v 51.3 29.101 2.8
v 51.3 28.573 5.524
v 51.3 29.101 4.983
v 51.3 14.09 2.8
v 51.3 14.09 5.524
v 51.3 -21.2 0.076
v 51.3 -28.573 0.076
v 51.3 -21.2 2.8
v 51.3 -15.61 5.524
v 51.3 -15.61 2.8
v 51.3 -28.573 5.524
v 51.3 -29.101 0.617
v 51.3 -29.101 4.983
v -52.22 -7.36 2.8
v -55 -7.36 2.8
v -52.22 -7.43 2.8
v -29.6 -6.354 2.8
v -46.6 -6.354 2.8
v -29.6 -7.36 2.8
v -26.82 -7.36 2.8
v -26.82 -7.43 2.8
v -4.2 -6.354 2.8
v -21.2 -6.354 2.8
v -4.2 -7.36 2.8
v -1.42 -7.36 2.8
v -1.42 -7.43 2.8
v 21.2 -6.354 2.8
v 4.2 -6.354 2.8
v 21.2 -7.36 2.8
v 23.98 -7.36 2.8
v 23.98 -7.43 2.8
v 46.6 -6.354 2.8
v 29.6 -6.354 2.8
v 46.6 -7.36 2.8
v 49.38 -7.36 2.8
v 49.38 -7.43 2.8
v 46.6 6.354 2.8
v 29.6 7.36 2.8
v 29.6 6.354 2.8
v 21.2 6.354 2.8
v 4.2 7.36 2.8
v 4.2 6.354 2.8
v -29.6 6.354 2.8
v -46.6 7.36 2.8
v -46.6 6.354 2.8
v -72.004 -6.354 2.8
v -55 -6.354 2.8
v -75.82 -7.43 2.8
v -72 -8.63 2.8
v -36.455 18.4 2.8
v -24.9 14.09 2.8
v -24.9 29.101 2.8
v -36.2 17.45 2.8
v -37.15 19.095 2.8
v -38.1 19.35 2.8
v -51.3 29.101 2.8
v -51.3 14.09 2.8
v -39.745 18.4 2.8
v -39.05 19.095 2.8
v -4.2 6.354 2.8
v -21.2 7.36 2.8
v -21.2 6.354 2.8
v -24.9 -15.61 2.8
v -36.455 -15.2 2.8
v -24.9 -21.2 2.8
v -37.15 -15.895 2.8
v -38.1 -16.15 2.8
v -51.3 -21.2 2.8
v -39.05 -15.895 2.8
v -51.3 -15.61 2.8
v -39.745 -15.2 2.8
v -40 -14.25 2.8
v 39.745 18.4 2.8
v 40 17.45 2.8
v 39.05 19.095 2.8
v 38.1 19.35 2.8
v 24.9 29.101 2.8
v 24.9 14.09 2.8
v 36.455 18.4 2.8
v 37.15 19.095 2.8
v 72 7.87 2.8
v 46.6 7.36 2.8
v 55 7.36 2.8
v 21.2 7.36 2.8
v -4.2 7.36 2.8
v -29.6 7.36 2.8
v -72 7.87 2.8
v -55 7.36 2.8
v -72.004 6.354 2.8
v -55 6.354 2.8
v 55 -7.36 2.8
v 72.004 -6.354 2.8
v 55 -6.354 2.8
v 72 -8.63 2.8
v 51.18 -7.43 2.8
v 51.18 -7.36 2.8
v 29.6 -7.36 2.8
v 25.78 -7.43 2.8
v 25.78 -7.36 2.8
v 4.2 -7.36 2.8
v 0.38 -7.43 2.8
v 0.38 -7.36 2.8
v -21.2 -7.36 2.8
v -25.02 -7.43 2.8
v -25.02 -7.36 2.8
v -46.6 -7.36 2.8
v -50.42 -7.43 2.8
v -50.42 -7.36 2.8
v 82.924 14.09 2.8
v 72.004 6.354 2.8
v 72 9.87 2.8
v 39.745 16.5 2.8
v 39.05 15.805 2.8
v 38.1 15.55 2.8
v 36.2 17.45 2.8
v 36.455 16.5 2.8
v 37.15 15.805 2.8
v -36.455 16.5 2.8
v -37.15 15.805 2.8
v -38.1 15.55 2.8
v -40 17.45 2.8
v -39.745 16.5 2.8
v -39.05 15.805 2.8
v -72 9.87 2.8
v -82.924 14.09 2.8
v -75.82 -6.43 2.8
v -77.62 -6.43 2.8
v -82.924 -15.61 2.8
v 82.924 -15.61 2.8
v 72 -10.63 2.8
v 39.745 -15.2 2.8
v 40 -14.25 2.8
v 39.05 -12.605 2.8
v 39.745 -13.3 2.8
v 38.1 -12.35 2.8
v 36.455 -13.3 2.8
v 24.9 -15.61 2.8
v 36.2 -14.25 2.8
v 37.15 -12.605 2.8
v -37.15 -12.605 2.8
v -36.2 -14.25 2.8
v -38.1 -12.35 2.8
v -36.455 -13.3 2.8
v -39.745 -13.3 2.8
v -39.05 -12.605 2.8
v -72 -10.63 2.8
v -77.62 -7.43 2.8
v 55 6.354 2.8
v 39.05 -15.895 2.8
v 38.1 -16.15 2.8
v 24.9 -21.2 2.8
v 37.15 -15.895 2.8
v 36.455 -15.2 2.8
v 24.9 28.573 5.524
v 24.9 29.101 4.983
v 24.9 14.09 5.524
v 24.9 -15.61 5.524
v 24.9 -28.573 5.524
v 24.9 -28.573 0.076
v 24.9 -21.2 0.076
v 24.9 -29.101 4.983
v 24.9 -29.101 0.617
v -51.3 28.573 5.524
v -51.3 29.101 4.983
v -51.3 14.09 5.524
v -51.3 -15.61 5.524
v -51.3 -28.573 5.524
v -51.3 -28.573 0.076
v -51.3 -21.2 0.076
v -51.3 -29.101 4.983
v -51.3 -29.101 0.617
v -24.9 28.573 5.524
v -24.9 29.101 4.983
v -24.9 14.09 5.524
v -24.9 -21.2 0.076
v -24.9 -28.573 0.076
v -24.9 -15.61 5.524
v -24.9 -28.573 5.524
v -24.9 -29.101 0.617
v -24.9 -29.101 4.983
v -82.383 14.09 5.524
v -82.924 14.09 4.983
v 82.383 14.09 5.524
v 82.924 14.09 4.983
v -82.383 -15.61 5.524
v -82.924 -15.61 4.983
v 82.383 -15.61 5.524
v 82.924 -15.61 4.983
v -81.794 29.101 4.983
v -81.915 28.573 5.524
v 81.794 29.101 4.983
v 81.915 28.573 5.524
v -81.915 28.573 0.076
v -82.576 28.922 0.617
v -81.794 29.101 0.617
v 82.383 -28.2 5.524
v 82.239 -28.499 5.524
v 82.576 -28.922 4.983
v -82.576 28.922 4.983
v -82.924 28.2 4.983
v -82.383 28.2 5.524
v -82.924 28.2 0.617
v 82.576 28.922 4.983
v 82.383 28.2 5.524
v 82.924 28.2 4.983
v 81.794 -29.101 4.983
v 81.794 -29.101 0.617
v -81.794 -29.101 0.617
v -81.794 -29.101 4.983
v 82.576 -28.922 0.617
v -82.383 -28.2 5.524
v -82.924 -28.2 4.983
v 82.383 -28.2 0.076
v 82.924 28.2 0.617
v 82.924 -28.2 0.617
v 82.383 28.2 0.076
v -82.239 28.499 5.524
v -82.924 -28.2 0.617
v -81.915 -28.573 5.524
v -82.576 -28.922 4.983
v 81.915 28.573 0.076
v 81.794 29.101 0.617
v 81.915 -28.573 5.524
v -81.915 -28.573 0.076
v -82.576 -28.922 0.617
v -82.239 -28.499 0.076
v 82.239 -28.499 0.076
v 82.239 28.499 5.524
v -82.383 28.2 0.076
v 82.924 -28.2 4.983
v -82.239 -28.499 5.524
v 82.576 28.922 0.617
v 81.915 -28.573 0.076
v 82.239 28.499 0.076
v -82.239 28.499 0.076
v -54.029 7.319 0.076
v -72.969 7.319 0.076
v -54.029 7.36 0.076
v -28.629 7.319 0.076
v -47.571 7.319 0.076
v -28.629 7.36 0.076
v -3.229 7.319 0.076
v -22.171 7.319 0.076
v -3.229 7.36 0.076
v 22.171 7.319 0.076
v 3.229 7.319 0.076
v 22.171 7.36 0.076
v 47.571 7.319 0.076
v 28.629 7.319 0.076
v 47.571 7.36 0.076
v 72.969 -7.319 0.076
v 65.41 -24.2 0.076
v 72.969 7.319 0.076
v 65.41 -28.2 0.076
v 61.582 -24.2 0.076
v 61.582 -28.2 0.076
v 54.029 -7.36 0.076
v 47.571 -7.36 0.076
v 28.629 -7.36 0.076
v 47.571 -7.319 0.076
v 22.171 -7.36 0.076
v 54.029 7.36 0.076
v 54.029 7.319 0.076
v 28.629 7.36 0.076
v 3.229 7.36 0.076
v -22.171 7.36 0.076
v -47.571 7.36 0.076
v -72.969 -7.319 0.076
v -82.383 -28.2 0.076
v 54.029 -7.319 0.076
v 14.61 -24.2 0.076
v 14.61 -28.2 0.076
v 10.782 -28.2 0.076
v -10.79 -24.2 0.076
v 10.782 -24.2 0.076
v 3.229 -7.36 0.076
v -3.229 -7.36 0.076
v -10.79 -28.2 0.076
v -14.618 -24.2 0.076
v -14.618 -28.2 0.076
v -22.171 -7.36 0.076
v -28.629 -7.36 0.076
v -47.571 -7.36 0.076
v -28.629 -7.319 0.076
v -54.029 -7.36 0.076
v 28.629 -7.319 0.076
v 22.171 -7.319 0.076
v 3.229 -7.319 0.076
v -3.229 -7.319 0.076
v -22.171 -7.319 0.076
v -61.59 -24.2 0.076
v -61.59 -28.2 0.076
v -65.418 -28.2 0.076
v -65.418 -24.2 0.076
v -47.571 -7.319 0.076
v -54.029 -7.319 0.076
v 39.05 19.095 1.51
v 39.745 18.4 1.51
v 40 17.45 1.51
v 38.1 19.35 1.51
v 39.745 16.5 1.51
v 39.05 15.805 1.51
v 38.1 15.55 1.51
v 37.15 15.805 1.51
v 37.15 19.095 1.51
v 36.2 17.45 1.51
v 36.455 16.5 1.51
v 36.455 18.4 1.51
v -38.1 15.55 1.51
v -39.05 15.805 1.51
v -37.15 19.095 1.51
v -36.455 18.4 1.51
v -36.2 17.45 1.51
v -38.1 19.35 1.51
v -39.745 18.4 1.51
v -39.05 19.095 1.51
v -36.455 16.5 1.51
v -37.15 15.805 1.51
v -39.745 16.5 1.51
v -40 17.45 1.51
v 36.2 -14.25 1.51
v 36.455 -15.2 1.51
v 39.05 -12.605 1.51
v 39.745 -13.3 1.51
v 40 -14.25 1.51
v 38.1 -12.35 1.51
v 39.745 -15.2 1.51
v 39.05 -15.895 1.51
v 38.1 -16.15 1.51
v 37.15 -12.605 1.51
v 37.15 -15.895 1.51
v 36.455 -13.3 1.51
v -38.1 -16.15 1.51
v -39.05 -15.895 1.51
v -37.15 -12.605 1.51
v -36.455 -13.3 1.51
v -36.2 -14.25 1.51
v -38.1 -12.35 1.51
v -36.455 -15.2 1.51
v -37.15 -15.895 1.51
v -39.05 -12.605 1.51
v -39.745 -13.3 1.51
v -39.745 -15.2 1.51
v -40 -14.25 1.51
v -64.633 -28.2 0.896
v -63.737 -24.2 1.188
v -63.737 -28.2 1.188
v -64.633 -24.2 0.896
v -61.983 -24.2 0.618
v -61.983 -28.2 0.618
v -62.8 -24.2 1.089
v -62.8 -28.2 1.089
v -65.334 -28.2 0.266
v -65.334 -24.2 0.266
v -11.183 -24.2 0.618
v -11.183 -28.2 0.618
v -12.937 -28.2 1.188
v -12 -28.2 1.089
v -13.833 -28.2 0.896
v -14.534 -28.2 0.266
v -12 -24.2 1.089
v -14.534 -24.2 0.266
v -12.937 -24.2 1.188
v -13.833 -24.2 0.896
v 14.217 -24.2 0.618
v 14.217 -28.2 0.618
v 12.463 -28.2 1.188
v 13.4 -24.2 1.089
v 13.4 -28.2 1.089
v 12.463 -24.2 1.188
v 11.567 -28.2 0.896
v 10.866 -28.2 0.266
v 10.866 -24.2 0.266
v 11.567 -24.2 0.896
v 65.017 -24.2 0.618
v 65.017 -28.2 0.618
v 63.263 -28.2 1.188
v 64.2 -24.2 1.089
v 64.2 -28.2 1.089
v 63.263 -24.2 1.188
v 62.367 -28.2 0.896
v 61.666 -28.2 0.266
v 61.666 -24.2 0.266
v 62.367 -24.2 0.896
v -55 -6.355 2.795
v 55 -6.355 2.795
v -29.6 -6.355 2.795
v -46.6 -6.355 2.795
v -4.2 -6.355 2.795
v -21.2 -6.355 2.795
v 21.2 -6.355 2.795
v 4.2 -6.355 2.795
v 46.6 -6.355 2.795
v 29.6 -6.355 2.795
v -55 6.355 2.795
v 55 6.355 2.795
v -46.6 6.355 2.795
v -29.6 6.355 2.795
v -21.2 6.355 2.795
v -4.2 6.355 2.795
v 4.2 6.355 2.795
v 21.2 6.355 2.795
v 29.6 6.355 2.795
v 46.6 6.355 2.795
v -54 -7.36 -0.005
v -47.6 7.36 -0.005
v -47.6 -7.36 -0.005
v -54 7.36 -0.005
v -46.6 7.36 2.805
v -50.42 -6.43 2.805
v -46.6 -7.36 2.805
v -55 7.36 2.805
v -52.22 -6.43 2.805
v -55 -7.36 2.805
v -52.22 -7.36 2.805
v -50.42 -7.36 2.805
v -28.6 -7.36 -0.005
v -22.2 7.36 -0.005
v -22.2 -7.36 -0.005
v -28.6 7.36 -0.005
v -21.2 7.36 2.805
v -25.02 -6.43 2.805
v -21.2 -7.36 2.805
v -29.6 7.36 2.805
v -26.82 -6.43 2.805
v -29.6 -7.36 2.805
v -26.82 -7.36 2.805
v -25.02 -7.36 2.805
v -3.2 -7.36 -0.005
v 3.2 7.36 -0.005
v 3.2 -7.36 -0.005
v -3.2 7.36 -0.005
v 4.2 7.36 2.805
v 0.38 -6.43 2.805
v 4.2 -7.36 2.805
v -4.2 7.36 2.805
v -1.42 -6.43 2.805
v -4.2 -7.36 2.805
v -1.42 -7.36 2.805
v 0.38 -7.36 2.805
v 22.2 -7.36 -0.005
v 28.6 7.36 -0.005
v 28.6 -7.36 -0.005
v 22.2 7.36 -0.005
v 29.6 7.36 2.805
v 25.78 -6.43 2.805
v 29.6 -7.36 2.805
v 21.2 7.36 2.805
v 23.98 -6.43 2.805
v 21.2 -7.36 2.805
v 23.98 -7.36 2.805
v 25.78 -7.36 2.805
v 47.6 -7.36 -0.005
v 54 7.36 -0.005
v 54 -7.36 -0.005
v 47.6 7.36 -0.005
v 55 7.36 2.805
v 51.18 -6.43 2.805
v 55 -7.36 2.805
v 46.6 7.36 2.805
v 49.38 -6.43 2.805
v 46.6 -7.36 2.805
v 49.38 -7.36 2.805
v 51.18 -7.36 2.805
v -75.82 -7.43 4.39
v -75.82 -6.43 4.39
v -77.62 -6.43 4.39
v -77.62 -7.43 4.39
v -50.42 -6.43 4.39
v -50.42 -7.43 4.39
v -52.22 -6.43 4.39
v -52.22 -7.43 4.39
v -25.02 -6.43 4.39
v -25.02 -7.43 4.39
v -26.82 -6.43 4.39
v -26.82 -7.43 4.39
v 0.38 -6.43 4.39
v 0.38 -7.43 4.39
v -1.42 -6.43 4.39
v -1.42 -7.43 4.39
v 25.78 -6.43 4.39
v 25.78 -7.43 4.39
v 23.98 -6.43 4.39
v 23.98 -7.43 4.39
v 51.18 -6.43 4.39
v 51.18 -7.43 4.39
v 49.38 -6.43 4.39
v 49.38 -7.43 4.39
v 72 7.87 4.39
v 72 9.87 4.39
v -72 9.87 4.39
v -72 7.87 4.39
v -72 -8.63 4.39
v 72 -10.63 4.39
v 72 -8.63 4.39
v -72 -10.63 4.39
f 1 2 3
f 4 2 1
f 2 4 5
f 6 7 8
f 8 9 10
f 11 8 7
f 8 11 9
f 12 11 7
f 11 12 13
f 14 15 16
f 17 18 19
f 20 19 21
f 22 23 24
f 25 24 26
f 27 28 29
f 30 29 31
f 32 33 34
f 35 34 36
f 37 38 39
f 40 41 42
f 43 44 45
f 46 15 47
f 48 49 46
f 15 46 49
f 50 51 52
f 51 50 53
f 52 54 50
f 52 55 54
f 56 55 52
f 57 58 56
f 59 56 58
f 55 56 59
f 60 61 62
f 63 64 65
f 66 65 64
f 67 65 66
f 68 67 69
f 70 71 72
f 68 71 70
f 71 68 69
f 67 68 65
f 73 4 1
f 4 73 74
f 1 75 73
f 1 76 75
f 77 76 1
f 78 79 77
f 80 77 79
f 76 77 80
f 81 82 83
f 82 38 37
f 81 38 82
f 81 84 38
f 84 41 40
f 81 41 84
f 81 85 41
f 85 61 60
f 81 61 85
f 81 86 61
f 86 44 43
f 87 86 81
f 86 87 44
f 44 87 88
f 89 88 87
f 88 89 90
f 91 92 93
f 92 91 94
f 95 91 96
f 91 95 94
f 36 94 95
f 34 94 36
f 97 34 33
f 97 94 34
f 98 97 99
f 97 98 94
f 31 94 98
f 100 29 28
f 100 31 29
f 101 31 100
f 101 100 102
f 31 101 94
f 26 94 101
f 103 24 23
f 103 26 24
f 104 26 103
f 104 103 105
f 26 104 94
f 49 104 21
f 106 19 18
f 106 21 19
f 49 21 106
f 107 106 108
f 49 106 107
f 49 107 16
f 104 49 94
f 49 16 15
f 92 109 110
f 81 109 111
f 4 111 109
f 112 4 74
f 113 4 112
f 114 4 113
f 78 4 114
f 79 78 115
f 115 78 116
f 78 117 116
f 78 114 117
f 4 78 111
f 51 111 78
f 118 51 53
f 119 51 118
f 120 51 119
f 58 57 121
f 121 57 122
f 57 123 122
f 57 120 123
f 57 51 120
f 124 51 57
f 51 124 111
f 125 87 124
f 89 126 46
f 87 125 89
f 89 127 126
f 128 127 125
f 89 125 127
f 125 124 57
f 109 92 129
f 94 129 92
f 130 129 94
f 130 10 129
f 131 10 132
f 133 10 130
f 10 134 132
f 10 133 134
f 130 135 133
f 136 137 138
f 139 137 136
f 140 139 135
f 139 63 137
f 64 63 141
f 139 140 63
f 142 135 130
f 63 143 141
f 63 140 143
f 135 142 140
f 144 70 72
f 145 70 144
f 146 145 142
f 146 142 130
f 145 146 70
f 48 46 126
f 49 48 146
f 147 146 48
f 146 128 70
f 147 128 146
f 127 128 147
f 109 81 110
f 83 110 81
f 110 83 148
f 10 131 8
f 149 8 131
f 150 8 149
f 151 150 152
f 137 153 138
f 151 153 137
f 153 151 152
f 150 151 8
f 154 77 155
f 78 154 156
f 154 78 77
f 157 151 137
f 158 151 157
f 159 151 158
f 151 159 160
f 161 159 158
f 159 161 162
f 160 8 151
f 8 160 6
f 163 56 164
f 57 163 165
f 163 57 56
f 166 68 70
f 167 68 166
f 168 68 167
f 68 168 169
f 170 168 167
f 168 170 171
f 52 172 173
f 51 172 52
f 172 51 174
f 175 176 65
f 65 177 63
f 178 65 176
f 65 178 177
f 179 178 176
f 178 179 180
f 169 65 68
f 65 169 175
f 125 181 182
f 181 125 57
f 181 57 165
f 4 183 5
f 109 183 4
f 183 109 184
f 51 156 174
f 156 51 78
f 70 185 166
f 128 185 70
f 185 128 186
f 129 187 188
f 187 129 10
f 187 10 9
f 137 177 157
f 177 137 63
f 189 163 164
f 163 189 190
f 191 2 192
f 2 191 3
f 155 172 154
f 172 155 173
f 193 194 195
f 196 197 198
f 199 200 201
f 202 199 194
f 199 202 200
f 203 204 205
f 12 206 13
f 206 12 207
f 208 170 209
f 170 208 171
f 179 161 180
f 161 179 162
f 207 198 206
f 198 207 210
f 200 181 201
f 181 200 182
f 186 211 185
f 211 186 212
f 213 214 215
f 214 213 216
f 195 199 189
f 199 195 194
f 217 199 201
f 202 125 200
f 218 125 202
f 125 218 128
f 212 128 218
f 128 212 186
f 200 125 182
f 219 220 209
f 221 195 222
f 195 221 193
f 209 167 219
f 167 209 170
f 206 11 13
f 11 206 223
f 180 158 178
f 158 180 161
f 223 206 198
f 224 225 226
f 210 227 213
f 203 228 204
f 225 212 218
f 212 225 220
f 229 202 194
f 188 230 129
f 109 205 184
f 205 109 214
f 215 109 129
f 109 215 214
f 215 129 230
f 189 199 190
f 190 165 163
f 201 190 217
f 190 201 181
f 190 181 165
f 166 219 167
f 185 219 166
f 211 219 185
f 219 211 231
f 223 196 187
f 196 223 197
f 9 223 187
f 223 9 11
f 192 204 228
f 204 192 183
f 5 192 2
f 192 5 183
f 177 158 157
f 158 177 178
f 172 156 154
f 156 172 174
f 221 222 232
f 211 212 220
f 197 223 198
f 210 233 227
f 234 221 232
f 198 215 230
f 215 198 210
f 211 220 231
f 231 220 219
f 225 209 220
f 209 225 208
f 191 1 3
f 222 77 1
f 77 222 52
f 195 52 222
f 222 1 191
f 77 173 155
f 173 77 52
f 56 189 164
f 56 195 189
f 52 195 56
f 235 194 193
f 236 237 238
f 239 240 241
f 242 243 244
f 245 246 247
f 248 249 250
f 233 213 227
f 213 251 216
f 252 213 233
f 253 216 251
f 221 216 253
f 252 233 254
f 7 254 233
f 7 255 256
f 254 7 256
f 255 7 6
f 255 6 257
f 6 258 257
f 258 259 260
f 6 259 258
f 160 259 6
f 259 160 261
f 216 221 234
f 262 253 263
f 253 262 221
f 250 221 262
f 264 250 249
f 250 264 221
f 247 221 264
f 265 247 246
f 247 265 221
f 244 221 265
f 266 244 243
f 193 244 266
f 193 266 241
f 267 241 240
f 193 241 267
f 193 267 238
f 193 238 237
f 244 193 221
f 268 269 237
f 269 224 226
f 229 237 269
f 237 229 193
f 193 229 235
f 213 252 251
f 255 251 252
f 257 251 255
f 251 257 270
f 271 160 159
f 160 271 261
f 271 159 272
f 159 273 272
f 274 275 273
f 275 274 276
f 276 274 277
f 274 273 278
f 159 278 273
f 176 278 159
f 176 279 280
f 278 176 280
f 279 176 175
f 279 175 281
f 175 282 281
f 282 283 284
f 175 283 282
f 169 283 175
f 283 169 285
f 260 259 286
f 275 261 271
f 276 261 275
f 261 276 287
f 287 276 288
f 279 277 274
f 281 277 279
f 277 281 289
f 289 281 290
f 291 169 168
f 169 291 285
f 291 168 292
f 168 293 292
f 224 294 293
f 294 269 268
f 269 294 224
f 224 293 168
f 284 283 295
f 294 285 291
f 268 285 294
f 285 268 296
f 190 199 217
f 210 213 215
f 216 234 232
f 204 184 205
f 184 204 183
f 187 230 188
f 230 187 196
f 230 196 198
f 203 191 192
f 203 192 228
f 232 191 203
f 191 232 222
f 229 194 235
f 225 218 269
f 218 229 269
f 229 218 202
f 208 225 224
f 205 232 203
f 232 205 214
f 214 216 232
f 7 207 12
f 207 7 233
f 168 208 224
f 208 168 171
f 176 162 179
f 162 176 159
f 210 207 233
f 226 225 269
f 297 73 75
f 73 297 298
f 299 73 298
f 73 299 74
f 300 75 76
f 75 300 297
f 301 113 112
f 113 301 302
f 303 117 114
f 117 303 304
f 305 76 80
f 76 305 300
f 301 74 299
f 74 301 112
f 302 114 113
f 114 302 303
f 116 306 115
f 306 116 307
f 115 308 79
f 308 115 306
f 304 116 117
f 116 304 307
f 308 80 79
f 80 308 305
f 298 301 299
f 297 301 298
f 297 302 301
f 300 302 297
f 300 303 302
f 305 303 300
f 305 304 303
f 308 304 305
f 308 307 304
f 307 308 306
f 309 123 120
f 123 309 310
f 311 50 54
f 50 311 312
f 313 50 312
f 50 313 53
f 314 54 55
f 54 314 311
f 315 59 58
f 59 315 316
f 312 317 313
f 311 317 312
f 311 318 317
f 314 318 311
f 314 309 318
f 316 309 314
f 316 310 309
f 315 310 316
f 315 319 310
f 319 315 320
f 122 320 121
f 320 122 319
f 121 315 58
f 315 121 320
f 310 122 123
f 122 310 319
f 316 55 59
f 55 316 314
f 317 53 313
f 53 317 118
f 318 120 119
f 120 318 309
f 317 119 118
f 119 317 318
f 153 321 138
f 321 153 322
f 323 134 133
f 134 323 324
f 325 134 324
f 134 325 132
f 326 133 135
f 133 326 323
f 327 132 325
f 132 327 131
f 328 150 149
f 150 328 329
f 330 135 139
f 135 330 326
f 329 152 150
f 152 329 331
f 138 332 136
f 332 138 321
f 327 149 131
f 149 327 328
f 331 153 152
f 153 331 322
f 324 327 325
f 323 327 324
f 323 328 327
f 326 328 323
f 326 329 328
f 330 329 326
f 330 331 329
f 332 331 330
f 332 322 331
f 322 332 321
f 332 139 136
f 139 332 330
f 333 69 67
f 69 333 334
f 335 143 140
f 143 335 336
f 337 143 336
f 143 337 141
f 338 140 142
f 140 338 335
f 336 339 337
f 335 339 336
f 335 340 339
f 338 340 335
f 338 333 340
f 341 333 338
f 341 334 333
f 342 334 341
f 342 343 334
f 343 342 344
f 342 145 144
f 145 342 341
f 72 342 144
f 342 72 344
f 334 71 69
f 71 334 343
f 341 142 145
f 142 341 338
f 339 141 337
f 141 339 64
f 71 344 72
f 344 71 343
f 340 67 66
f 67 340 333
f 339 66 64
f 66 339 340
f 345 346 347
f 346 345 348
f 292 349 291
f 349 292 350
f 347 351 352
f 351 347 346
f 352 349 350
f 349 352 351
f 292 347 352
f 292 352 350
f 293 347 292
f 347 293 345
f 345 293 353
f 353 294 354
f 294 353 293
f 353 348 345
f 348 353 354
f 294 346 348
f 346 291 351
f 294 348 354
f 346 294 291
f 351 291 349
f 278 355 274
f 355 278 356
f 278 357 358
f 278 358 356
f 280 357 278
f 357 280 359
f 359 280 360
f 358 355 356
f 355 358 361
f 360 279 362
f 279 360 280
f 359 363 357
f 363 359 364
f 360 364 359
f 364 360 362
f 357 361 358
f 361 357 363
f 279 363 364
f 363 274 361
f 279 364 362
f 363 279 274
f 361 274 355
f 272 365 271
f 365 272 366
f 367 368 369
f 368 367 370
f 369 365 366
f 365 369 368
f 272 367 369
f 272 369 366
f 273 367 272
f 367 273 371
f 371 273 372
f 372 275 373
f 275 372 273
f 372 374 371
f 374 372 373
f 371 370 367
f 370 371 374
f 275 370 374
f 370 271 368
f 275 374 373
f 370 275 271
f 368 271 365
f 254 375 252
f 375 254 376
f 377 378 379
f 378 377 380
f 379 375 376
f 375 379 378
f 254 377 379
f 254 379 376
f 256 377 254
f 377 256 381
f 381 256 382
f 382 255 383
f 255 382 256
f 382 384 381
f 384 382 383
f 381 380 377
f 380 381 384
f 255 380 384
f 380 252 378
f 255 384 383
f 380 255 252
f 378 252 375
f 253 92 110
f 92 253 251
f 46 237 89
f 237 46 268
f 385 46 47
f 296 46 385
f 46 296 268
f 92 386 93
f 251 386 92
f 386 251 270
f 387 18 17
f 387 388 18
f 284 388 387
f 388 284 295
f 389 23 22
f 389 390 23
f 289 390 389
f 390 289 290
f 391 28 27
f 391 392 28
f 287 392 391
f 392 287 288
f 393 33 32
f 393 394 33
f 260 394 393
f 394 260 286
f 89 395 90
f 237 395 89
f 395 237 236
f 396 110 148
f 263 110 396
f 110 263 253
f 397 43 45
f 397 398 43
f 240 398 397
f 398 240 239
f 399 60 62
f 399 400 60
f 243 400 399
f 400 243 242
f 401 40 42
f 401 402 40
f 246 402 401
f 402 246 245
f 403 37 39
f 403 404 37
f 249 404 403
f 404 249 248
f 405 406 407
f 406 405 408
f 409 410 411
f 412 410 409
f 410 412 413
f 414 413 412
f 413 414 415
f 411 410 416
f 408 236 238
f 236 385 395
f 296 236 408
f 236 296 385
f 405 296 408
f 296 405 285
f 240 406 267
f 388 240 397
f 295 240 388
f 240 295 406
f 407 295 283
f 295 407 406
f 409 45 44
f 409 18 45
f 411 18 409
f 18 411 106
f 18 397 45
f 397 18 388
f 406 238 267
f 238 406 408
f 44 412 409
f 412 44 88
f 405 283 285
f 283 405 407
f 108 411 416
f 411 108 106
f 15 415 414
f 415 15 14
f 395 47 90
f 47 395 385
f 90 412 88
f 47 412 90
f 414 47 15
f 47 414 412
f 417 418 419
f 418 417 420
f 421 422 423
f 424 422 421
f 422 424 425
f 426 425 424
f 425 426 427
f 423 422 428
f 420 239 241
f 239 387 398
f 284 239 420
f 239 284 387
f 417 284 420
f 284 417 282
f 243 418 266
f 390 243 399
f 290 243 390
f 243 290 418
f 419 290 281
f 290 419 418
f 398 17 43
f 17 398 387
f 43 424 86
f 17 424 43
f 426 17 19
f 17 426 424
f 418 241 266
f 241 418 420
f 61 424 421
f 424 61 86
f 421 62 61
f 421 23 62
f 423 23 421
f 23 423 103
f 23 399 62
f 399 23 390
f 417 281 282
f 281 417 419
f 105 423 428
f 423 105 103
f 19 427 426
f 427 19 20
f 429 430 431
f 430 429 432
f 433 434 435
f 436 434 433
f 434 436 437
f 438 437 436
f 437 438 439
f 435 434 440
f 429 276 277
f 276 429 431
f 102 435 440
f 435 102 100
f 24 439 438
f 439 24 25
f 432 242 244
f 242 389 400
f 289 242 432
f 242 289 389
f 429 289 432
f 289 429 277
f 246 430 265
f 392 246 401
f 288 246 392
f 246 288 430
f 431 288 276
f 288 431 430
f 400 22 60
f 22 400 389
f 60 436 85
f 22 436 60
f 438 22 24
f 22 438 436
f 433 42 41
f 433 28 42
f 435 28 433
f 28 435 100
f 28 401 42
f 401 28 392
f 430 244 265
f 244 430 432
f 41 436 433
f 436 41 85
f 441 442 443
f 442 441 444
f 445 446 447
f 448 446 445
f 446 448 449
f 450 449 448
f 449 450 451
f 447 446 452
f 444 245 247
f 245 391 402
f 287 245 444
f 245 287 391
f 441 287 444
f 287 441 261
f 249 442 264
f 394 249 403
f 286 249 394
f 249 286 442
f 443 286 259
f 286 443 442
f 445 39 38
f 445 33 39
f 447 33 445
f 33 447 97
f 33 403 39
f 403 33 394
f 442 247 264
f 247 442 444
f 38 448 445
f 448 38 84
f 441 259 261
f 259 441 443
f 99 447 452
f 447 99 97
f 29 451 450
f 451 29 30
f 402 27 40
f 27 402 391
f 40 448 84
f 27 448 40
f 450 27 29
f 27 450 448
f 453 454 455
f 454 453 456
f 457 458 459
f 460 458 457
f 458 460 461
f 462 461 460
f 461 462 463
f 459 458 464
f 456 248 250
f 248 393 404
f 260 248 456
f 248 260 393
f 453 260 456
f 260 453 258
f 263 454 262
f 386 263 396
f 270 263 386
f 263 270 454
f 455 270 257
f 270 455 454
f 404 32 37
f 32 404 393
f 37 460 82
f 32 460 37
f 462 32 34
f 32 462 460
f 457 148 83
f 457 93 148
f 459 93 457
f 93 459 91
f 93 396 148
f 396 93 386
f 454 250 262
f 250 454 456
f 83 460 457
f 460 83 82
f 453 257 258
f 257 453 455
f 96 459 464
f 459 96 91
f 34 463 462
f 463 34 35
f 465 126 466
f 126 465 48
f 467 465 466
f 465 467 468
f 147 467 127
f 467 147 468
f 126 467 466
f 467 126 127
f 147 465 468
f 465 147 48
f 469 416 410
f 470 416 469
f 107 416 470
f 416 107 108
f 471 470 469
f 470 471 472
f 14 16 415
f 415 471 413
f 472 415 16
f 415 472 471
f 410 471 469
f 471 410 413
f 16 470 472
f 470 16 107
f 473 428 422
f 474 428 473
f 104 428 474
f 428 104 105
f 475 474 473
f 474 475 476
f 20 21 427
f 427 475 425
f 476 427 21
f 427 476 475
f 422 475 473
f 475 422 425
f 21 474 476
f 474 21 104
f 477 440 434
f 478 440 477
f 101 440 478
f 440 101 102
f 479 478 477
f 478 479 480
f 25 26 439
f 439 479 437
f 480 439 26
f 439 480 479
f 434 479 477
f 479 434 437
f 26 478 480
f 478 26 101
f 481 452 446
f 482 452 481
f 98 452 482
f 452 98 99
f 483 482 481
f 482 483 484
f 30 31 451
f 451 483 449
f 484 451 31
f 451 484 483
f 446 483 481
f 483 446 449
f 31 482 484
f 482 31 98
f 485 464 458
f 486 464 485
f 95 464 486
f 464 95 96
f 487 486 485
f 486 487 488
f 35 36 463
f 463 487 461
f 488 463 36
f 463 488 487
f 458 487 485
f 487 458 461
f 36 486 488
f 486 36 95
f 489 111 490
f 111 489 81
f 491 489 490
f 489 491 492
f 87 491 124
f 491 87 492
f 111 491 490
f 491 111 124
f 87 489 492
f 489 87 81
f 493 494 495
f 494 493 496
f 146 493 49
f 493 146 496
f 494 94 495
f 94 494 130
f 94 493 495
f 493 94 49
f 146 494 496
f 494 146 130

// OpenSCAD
// -*- mode: SCAD ; c-file-style: "ellemtel" ; coding: utf-8 -*-
//
// Holder to scan 110 film strips with a Reflecta ProScan 10T
//
// Copyright 2018 Roland Sieker <ospalh@gmail.com>
// Licence: CC-BY-SA 4.0


/* [Global] */


// ... to preview. You will get both parts when you click "Create Thing".
part = "halter"; // [halter: film holder, einsatz: film holder clamp]

// Set this to "render" and click on "Create Thing" when done with the setup.
preview = 1; // [0:render, 1:preview]

/* [Holder] */

// Width of the holder. This one and the next one are the two values you do need to set up for your scanner. Preset is for a Reflecta proScan. Maybe subtract half a millimtre for a better fit.
holder_width = 58.4;  // [20:0.1:150]

// Height or thickness of the holder. See above. You know they were too high when you need a mallet to go from one image to the next...
holder_thickness = 5.6;  // [3:0.1:10]

// How many exposures on the longest strips you want to fit into this. Make sure the resulting holder still fits onto your print bed.
images_per_strip = 6;  // [1:1:15]

// Different manufacturers' scanners place their little catches to position the holder at different sides.
position_notch_side = 90;  // [90: bottom, 0: side]

/* [Magnets] */

// Diameter of the magnet hole. Add clearance by hand here. Set to 0 for no magnet holes.
magnet_diameter = 3.8;  // [0:0.1:15]
// Height or thickness of the magnet. Make sure to use magnets flat enough to fit.
magnet_height = 1;  // [0.5:0.1:3]

/* [Hidden] */

// Das ganze Filmgroessen-Geraffel wieder verstecken: ein thing pro
// Film. Teil der Automatik (mit/ohne Stege, Lang-oder Kurzkerbe) sind so
// halbwegs inaktiv.


// Width of the film
film_width = 16;  // [8:0.1:70]
// Length from the left edge of an exposure to its right edge
image_width = 17; // [8:0.1:100]
image_pitch = 127/5;  // Ein Fuenferstreifen ist genau so lang wie ein
// vierer 126-Streifen. Angeblich ist das irgend etwas rundes in
// Zoellen. Das muss mich nicht scheren.

// Size of an exposure from bottom to top.
image_height = 12.7; // Genau 300 Pixel hoch bei einem 600 dpi Scan.
rand_unten = 1.27;  // Koennten 1/20 Zoll sein. What TF ever. Ich koennte 118 Schweizerfranken bezahlen und es im Standard nachlesen. Oder das Geld sparen
rand_oben = film_width - image_height - rand_unten;

bildabstand = max(image_pitch, image_width);
l_filmsteg = max(0, bildabstand-image_width);
r_r = 1.0;  // Rundungsradius

// Auch wichtig:
l_zk = 4;  // Laenge Zentrierkerbe
b_zk = 4;  // Breite Zentrierkerbe
h_zk = 1.2;  // Tiefe der Zentrierkerbe
w_zk = 1;  // Wand bzw Abstand der Zentrierkerbe vom Rand





w_schraeg = 1;  // Breite der Abschraegung rund um die Filmfenster

kurzsteg_grenze = w_schraeg;  // Weniger als 1 mm pro Seite: Kurzstege

mit_langsteg_oben = ( rand_oben >= kurzsteg_grenze);
mit_langsteg_unten = ( rand_unten >= kurzsteg_grenze);

min_l_ksteg = 0.8;

w_steg = 2;  // Breite fuer Stuecke, die den Film zentrieren.
l_kurzsteg = 0.4*bildabstand;  // Laenge fuer Stuecke, die den Film zentrieren,
// wenn wir keine Fensterstege machen


magnet_off_oben = -2;
magnet_off_unten = 1.2;

w_filmloch = 1.5;
l_filmloch = 2.3;
// dy_fl_bl = 1.25; // Abstand Filmloch oben zum Blidbereich
dy_fl_k = 0.7;  // Abstand Filmloch oben zur Filmkante
dx_fl_sm = 0.63;  // Abstand Filmloch links zur Mitte des Stegs


// *******************************************************
// Extra parameters. These can be changed reasonably safely.


w = 1.8;  // Wall width
p = 1.2;  // Bottom, top plate height
c = 0.5;  // Clearance
c_z = 0.3;  // Clearance in z direction. Mostly for the magnet hole and centering ridge
angle = 60; // Overhangs much below 60 degrees are a problem for me


// Halbwegs wichtig
h_steg = 1.6;  // Hoehe fuer Stuecke, die den Film zentrieren.
h_nut = h_steg + c_z;  // Tiefe fuer Stuecke, auf denen der Film nicht aufliegt



// *******************************************************
// Some shortcuts. These shouldn't be changed

tau = 2 * PI;  // pi is still wrong. tau = circumference / r

xy_factor = 1/tan(angle);
// To get from a height to a horizontal width inclined correctly
z_factor = tan(angle);  // The other way around

some_distance = 1.2 * holder_width;
ms = 0.01;  // Muggeseggele.

// fn for differently sized objects and fs, fa; all for preview or rendering.
pna = 40;
pnb = 15;
pa = 5;
ps = 1;
rna = 180;
rnb = 30;
ra = 1;
rs = 0.1;
function na() = (preview) ? pna : rna;
function nb() = (preview) ? pnb : rnb;
$fs = (preview) ? ps : rs;
$fa = (preview) ? pa : ra;

// l_fenster = bildabstand * images_per_strip;
l_fenster = bildabstand * (images_per_strip - 1) + image_width;
l_rand = 2 * w_steg + w_schraeg + 6;  // Etwas mehr fuer Extra-Zentriernasen
w_rand = w_schraeg + 7;
l_ue_a =  l_fenster + 2*l_rand;
w_einsatz = image_height + 2 * w_rand;
h_bd = holder_thickness/2;  // Hoehe Boden oder Deckel

l_griff = 25.4;
o_griff = l_ue_a/2-l_fenster/2 + image_width/2 + image_pitch/2;
w_griff = 6;


to_griff = l_ue_a/2 - o_griff - l_griff/2;



// *******************************************************
// End setup




// *******************************************************
// Generate the parts


print_part();
// filmhalter();
// einsatz();
// preview_parts();
// stack_parts();



module print_part()
{
   if ("halter" == part)
   {
      filmhalter();
   }
   if ("einsatz" == part)
   {
      einsatz();
   }
}

module preview_parts()
{
   filmhalter();
   translate([0, some_distance, 0])
   {
      einsatz();
   }
}

module stack_parts()
{
   // intersection()
   {
       // color("yellow")
      {
         filmhalter();
      }
      translate([0,0,holder_thickness + ms])
      {
         rotate([0,180,0])
         {
            // color("red")
            {
               einsatz();
            }
         }
      }
   }
}

// *******************************************************
// Code for the parts themselves


module filmhalter()
{
   difference()
   {
      basis_filmhalter();
      fenster();
      magnetausschnitte();
      kerben(false);
   }
   fensterstege();
   bodenstege();
}

module einsatz()
{
   difference()
   {
      union()
      {
         difference()
         {
            basis_einsatz();
            fenster();
         }
         fensterstege();
      }
      einsatzausschnitte();
      // magnetausschnitte(magnet_diameter/2);
      magnetausschnitte();
      kerben(true);
   }

}


module basis_filmhalter()
{
   translate([0,0,h_bd])
   {
      difference()
      {
         massiver_halter();
         einsatz_ausschnitt(2*c);
      }
   }
}


module basis_einsatz()
{
   translate([0,0,h_bd])
   {
      intersection()
      {
         massiver_halter();
         rotate([0,180,0])
         {
            einsatz_ausschnitt(0);
         }
      }
   }

}

module massiver_halter()
{
   hull()
   {
      vosp();
      mirror([0,0,1])
      {
         vosp();
      }
   }

   module vosp()
   {
      tosp();
      mirror([0,1,0])
      {
         tosp();
      }
   }
   module tosp()
   {
      osp();
      mirror([1,0,0])
      {
         osp();
      }

   }

   module osp()
   {
      translate([l_ue_a/2-r_r, holder_width/2-r_r, holder_thickness/2-r_r])
      {
         sphere(r=r_r);
      }
   }
}


module einsatz_ausschnitt(ec)
{
   translate([0, 0, holder_thickness])
   {
      translate([0, rand_unten - rand_oben, 0])
      cube([l_ue_a+2*ms, w_einsatz + ec, 2*holder_thickness], center=true);
      grip_cut();
      mirror()
      {
         grip_cut();
      }
   }
   module grip_cut()
   {
      translate([to_griff, 0, 0])
      {
         cube([l_griff + ec, holder_width + 2*ms, 2*holder_thickness], center=true);
         translate([0, -holder_width/2, 0])
         {
            cube([l_griff + ec, 2*w_griff+4*ec, 4*holder_thickness], center=true);
         }
      }
   }
}

module fenster()
{
   translate([0, 0, h_bd])
   {
      hull()
      {
         translate([0,0,-0.5+ms])
         {
            cube([l_fenster, image_height, 1], center=true);
         }
         translate([0,0,-h_bd-0.5-ms])
         {
            cube(
               [l_fenster+2*w_schraeg, image_height+2*w_schraeg, 1], center=true);
         }
      }

   }
}


module magnetausschnitte()
{
   if (magnet_diameter > 0 && magnet_height > 0)
   {
      yo_mag = w_einsatz/2 + magnet_diameter/2;
      magnetausschnitt(to_griff, yo_mag + magnet_off_unten);
      magnetausschnitt(-to_griff, yo_mag + magnet_off_unten);
      magnetausschnitt(to_griff, -yo_mag - magnet_off_oben);
      magnetausschnitt(-to_griff, -yo_mag - magnet_off_oben);
   }
}

module magnetausschnitt(exo, eyo)
{


   // Mittig in den Griffen.
   translate(
      [exo, eyo, h_bd - magnet_height-c_z + ms])
   {
      cylinder(d=magnet_diameter, h=magnet_height+c_z);
      // N.B. Spiel ist schon im magnet_diameter eingerechnet
   }
}

module bodenstege()
{
   translate([0, 0, -ms+h_steg/2+h_bd])
   {
      if (mit_langsteg_unten)
      {
         langbodensteg(rand_unten);
      }
      else
      {
         kurzbodenstege(rand_unten);
      }
      if (mit_langsteg_oben)
      {
         rotate(180)
         {
            langbodensteg(rand_oben);
         }
      }
      else
      {
         rotate(180)
         {
            kurzbodenstege(rand_oben);
         }
      }
      zentriernasen();
   }
   module langbodensteg(eo)
   {
      translate([0,w_steg/2+image_height/2+c/2+eo, 0])
      {
         cube([l_fenster, w_steg, h_steg], center=true);
      }
   }
   module kurzbodenstege(eo)
   {
      for (i=[0:images_per_strip-1])
      {
         translate([-l_fenster/2 + (0.5 + i) * bildabstand, w_steg/2+image_height/2+eo+c/2, 0])
         {
            cube([l_kurzsteg, w_steg, h_steg], center=true);
         }
      }
   }
   module zentriernasen()
   {
      for (i=[-0.5:1:images_per_strip-1.5])
      {
         // Eine mehr als Bilder:
         // Irgendwie ist "oben" und "unten" verkehrt. Fuer Teile oben
         // braucht mensch negative y-Werte.
         translate(
            [-l_fenster/2 + i * bildabstand+image_width/2 + dx_fl_sm +c/2 - l_filmloch,
             -image_height/2 - rand_oben + c/2 + dy_fl_k , -h_steg/2])

         {
            cube([l_filmloch-c, w_filmloch-c, h_steg]);
         }
      }
   }
}

module einsatzausschnitte()
{
   translate([0, 0, h_bd + ms-h_nut/2])
   {
      if (mit_langsteg_unten)
      {
         langausschnitt(rand_unten);
      }
      else
      {
         kurzausschnitte(rand_unten);
      }
      if (mit_langsteg_oben)
      {
         rotate(180)
         {
            langausschnitt(rand_oben);
         }
      }
      else
      {
         rotate(180)
         {
            kurzausschnitte(rand_oben);
         }
      }
      zentrierausschnitte();
   }
   module langausschnitt(eyo)
   {
      translate([0,w_steg/2+image_height/2+eyo+c/2,0])
      {
         cube([l_fenster+6*c, w_steg+2*c, h_nut], center=true);
      }
   }
   module kurzausschnitte(eyo)
   {
      for (i=[0:images_per_strip-1])
      {
         translate(
            [-l_fenster/2 + (0.5 + i) * bildabstand,
             w_steg/2+image_height/2+eyo+c/2-film_width/4 + image_height/4, 0])
         {
            cube(
               [l_kurzsteg+2*c, w_steg+2*c+film_width/2 - image_height/2,
                h_nut], center=true);
         }
      }
   }
      module zentrierausschnitte()
   {
      for (i=[0.5:1:images_per_strip-0.5])
      {
         translate(
            [-l_fenster/2 + i * bildabstand+image_width/2  - dx_fl_sm -c/2,
             -image_height/2 - rand_oben - c/2 + dy_fl_k , -h_nut/2])

         {
            cube([l_filmloch+c, w_filmloch+c, h_nut]);
         }
      }
   }
}


module fensterstege()
{
   if (l_filmsteg > 0)
   {
      for (i=[0.5:1:images_per_strip-1.5])
      {
         translate([-l_fenster/2 + i * bildabstand + image_width/2, 0, 0])
         {
            if (l_filmsteg < min_l_ksteg)
            {
               quader_fenstersteg();
            }
            else
            {
               keil_fenstersteg();
            }
         }
      }
   }
   module quader_fenstersteg()
   {
      translate([0,0,h_bd/2-ms])
      {
         cube([l_filmsteg, image_height+2*w_schraeg + 2*ms ,h_bd], center=true);
      }
   }
   module keil_fenstersteg()
   {
      l_fsb = max(l_filmsteg-2*w_schraeg,min_l_ksteg);
      ihp = image_height + 2*w_schraeg + 2*ms;
      hull()
      {
         translate([0,0,h_bd])
         {
            cube([l_filmsteg, ihp, ms], center=true);
         }
         //  translate([0,0,-ms])
         cube([l_fsb, ihp, ms], center=true);
      }
   }
}

module kerben(oben)
{
   // Den Radius der Zentrierkerbe kann mensch per Pythagoras bestimmen.
   // Hypothenuse = r_zk
   // 1. Kathete = l_zk/2
   // 2. Kathete = r_zk - h_zk
   // h_zk > 0
   // r_zk * r_zk = l_zk * l_zk / 4 + r_zk * r_zk - 2 * r_zk * h_zk + h_zk * h_zk
   // 0 = l_zk * l_zk / 4 - 2 * r_zk * h_zk + h_zk * h_zk
   // 2 * r_zk * h_zk =
   r_zk = (l_zk * l_zk / 4 + h_zk * h_zk) / (2 * h_zk);
   // Die Variable heisst "position_notch_side", und enthaelt einen Winkel. Funktioniert.
   dz_zk = (position_notch_side > 0) ?
      ( (oben) ? holder_thickness - h_zk + r_zk : h_zk-r_zk) :
      -ms;
   ahzk = (position_notch_side > 0) ? b_zk : holder_thickness + 2*ms;
   hk_yo = (position_notch_side > 0) ? -w_zk - b_zk : r_zk -h_zk;
   for (i=[0:images_per_strip-1])
   {
      translate(
         [-l_fenster/2 + i * bildabstand + image_width/2, -holder_width/2 -hk_yo, dz_zk])
      {
         rotate([position_notch_side,0,0])
         {
            cylinder(r=r_zk, h=ahzk);
         }
      }
   }

}
